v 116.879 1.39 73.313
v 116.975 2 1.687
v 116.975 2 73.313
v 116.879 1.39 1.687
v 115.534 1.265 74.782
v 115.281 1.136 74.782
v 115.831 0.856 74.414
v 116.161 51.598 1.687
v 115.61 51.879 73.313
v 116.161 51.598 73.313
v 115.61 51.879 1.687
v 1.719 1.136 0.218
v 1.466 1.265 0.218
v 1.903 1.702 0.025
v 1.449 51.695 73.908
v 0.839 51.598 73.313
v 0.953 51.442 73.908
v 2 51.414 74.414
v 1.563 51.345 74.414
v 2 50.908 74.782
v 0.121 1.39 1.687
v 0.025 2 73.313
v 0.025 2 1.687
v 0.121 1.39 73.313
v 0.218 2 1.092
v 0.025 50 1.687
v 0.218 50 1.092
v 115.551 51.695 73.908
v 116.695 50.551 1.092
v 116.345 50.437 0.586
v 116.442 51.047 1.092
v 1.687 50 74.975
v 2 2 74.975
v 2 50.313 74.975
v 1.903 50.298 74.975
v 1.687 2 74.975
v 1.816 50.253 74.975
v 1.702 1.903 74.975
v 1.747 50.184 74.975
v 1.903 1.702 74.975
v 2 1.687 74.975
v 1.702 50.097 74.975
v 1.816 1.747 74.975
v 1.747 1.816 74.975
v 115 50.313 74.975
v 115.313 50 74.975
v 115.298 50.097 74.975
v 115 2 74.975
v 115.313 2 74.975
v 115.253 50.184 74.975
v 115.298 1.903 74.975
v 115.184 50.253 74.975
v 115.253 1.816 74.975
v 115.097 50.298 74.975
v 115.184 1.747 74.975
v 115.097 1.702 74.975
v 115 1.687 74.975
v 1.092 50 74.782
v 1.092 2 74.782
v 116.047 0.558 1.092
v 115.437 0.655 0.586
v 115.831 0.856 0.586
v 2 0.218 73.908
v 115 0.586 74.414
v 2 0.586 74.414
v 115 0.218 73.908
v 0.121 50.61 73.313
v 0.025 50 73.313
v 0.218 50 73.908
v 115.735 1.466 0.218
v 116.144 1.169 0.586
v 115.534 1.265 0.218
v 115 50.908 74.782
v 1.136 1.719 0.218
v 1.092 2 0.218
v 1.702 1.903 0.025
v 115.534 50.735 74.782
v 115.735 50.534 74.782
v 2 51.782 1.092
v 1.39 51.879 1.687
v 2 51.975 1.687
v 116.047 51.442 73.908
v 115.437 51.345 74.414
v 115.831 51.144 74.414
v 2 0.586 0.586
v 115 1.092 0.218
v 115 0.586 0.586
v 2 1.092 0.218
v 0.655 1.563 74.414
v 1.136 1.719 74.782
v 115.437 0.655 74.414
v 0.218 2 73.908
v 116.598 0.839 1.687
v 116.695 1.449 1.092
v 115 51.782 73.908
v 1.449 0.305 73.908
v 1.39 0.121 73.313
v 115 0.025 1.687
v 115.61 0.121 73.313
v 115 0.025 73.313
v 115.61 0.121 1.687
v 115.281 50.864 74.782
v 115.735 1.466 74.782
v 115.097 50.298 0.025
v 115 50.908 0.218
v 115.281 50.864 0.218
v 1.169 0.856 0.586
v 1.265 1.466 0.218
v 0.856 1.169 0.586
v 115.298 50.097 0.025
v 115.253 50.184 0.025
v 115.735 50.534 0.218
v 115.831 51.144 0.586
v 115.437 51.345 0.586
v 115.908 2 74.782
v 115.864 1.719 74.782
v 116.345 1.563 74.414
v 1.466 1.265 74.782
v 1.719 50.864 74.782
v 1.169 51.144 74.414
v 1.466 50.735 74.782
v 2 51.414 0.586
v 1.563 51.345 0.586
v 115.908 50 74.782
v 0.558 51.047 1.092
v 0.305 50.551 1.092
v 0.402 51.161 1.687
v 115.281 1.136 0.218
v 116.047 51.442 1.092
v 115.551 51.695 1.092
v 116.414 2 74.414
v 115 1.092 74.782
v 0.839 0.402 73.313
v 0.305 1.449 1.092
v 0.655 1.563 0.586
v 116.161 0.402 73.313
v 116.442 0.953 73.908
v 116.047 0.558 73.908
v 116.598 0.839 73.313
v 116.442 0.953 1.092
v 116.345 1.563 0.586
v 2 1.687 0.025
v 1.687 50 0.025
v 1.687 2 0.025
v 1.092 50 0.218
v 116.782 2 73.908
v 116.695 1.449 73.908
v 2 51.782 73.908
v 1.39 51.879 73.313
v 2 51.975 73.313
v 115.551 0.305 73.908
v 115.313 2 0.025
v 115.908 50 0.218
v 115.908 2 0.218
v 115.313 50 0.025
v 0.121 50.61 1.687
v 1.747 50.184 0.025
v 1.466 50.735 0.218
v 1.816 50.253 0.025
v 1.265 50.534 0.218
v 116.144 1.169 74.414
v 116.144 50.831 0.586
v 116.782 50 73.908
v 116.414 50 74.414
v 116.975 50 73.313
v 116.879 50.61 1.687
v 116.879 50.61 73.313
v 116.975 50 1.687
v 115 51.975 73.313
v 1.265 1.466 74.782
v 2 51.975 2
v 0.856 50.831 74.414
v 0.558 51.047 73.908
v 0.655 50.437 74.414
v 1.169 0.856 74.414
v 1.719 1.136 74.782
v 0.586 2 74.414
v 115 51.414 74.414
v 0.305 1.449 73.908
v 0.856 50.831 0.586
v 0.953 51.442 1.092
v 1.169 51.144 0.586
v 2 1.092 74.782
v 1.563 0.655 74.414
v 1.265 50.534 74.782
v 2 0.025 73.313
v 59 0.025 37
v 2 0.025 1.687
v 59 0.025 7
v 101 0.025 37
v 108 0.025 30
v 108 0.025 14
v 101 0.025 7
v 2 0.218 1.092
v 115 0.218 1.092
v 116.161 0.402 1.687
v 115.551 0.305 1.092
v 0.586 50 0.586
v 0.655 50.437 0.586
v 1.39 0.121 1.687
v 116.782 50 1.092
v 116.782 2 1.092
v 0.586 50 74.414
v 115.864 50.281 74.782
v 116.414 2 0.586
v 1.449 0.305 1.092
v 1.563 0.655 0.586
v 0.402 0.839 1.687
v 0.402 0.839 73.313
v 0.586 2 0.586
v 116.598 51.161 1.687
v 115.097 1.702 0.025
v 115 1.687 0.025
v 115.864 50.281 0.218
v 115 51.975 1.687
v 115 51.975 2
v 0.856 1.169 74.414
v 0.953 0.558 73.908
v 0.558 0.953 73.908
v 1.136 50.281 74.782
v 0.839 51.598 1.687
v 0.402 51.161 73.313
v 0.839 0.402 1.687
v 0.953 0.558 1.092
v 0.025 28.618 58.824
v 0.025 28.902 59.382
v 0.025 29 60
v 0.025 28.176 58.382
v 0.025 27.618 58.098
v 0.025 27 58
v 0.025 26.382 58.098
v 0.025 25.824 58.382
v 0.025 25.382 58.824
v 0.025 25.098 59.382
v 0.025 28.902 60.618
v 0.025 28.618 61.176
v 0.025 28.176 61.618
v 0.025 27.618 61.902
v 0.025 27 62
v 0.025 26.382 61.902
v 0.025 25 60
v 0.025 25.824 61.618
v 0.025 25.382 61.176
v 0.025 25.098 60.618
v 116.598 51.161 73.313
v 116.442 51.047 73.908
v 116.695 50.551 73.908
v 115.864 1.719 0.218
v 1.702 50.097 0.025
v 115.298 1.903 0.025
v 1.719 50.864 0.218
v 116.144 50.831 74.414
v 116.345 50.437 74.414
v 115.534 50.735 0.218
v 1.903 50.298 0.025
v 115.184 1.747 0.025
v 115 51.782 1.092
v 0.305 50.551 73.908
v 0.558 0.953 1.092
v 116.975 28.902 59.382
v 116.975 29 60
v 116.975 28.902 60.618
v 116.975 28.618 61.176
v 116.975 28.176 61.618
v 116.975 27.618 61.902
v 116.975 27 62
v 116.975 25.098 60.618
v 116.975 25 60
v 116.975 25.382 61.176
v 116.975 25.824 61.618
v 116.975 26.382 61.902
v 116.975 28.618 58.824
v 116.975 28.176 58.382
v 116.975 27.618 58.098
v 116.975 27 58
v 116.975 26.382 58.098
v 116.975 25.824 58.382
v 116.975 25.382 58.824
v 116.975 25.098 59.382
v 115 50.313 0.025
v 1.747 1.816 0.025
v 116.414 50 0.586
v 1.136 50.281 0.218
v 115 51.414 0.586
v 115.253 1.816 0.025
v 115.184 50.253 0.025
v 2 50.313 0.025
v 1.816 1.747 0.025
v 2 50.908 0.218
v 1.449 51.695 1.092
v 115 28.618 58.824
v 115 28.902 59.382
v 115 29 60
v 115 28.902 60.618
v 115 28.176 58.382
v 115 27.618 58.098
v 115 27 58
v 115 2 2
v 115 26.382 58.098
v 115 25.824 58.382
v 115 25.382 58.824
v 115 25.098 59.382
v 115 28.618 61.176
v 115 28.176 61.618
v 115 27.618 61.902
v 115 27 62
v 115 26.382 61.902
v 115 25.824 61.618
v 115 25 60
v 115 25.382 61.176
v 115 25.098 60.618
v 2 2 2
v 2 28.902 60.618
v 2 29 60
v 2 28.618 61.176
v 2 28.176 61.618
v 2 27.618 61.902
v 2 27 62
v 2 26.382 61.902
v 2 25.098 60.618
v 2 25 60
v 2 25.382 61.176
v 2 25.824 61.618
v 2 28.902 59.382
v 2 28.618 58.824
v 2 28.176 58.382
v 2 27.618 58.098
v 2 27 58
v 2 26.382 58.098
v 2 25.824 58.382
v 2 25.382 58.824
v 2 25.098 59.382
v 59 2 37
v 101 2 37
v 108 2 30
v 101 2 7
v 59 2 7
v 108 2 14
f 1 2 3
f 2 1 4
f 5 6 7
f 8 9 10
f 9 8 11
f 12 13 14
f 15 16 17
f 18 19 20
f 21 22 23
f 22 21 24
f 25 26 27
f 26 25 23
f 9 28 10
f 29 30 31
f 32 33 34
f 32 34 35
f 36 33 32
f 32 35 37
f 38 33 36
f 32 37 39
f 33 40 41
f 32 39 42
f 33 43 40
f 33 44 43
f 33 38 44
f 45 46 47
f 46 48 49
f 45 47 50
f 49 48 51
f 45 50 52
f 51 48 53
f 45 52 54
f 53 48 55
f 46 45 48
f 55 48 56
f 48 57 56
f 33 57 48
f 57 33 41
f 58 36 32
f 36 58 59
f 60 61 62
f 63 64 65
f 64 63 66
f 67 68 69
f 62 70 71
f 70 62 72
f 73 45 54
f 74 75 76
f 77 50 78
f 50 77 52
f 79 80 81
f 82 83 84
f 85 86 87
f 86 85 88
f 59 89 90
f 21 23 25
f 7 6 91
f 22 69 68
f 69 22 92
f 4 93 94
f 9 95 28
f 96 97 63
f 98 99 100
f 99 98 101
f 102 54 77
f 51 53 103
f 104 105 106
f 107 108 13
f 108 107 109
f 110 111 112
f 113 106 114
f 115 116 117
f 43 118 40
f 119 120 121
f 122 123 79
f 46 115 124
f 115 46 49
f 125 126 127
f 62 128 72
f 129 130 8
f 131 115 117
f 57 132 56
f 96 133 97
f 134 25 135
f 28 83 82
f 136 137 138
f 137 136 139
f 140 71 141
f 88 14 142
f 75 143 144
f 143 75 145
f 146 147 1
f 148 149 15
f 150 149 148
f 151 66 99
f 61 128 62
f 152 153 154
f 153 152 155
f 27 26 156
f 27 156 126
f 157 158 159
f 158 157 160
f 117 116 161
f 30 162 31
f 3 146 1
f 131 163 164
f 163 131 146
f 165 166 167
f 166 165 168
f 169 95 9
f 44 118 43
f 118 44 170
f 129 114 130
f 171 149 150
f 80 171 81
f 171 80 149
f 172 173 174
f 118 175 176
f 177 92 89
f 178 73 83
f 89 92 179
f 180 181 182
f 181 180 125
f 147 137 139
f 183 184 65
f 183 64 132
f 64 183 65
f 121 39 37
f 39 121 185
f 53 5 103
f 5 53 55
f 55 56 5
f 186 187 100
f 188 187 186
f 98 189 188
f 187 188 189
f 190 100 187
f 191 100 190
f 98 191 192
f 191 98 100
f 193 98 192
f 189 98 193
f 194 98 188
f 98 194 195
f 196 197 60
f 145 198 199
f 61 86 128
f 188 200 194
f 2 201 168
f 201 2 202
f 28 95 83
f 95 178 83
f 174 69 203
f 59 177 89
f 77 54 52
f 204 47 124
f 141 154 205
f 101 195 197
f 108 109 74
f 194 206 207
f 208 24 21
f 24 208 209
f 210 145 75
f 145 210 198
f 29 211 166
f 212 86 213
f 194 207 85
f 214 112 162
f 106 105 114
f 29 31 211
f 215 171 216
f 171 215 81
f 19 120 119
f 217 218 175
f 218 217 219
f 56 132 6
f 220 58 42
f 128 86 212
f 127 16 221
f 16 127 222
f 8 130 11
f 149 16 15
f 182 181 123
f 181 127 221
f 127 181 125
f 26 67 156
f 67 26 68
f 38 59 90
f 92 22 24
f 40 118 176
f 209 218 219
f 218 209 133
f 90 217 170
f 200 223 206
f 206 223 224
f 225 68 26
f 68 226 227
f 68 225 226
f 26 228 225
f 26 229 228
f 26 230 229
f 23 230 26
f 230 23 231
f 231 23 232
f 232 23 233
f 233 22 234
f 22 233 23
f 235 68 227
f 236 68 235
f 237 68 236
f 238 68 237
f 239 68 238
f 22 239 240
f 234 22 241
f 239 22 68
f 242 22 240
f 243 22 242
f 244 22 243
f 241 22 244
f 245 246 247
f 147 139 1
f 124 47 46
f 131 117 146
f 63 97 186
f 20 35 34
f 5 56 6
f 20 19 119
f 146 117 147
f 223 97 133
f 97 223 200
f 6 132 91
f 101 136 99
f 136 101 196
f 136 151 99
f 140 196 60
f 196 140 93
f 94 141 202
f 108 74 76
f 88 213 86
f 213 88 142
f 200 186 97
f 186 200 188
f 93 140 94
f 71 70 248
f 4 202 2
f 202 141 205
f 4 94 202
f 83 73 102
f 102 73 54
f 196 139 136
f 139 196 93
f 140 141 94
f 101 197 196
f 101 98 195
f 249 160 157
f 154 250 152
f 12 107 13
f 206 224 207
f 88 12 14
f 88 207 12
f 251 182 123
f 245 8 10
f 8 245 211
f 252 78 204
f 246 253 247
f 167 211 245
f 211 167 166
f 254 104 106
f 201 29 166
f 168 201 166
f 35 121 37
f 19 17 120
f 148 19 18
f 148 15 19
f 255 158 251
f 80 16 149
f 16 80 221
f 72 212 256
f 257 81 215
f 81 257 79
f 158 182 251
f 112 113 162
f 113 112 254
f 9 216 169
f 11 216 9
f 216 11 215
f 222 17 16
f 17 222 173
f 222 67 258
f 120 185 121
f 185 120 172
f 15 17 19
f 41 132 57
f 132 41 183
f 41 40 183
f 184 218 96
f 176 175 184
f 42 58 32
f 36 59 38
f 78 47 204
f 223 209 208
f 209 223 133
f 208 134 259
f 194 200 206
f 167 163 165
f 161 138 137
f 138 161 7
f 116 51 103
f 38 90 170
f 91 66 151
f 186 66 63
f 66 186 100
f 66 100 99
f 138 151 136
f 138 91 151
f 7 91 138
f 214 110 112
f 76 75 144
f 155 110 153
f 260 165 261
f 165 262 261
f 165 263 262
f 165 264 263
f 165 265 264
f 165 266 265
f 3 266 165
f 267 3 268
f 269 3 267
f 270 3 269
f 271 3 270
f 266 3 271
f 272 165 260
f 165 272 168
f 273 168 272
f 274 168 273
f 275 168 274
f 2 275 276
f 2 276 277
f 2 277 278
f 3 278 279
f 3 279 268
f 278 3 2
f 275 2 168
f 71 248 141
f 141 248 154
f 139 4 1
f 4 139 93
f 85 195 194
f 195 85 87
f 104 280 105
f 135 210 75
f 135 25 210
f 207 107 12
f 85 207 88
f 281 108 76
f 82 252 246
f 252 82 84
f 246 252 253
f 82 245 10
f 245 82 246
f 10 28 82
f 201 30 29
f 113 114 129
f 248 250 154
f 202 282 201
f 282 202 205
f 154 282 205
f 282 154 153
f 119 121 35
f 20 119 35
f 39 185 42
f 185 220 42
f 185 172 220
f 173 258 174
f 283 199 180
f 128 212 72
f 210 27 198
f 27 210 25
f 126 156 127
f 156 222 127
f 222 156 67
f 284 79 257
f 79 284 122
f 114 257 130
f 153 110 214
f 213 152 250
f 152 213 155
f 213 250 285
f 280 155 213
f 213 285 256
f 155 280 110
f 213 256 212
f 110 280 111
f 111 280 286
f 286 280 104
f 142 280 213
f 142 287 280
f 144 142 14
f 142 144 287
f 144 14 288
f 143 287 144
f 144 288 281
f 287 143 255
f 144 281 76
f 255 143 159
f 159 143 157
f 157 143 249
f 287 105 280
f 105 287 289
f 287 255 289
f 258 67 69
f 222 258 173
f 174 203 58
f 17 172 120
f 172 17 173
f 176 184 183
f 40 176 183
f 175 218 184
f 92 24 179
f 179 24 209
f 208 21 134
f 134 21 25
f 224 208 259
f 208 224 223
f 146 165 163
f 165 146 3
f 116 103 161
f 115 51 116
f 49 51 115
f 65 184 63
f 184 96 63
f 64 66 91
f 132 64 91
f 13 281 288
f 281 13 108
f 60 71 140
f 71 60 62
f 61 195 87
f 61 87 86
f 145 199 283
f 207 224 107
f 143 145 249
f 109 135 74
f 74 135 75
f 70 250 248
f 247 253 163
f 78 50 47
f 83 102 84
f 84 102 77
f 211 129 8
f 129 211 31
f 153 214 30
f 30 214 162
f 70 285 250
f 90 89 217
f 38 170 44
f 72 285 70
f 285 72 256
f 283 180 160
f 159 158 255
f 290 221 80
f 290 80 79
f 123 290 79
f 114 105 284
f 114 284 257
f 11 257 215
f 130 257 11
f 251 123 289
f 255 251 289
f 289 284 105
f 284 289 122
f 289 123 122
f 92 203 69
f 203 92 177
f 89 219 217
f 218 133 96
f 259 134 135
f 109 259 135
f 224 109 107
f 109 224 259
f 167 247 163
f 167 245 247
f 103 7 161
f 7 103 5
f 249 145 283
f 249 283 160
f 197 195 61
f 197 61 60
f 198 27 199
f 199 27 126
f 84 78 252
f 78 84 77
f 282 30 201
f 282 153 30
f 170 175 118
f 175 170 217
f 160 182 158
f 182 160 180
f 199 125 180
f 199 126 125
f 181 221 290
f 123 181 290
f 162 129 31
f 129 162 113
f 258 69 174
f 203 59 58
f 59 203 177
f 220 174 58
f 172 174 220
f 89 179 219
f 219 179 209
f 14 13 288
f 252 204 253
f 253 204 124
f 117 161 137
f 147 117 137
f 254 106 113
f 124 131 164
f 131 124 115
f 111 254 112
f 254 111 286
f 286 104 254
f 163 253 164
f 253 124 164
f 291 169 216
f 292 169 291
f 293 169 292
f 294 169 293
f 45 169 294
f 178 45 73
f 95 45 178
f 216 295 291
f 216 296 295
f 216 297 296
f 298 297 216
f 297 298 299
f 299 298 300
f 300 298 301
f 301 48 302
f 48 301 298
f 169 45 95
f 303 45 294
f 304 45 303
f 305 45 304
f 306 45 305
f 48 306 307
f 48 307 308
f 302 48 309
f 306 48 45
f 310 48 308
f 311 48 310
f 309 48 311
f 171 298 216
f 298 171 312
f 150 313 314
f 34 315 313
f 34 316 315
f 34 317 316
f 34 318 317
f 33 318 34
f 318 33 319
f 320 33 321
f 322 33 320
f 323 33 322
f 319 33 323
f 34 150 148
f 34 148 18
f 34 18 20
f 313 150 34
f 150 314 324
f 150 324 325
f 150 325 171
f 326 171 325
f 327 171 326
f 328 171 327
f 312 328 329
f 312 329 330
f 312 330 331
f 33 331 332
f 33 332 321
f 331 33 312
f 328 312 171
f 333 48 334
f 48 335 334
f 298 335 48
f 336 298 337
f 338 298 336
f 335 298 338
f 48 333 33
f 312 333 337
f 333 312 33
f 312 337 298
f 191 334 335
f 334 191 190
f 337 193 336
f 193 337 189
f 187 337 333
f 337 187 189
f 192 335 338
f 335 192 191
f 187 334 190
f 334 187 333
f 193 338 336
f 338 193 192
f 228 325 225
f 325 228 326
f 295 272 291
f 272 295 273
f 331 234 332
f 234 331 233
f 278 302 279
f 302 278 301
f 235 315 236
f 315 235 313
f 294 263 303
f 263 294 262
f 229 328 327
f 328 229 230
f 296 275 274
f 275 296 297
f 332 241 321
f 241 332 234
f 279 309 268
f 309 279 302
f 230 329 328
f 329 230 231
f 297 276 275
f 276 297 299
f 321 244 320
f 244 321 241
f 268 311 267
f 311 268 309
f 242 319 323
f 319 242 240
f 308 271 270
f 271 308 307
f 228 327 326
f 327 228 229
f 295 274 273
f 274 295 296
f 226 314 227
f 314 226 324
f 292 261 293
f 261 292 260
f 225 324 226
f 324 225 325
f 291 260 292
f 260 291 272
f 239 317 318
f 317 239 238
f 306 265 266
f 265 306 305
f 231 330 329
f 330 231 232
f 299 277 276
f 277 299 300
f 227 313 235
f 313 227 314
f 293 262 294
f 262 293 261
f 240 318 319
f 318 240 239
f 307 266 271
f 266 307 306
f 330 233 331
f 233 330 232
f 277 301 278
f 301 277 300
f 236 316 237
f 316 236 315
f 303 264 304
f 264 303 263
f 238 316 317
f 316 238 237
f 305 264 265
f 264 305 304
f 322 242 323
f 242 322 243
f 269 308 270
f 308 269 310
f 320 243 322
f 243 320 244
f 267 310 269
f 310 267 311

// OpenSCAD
/* [Plug Options] */
//The width of the plug, in mm (The long way)
plugWidth=49;
//The height of the plug, in mm (The short way)
plugHeight=30;
//How far the angles on the plug should go, measured along the x axis from the right, in mm
plugChamfer=7;
//At 0, the plug will be in the bottom right corner, but not hitting the chamfer or the interior. This moves the plug left, in mm.
plugXOffset=5;
//Moves the plug up, in mm
plugZOffset=5;

/* [Case Options] */
//The thickness of the case, in mm
thickness=2;
//The width of the interior of the case, in mm
width=113;
//The height of the case, in mm
height=75;
//The interior depth of the case, in mm
depth=50;
//The radius of the fillets (Rounded edges), in mm. Set to 0 for square edges
filletR=2;

/* [Hole] */
//Whether or not to make the hole for a screw.
makeHole="Yes";//[Yes,No]
//The diameter of the hole
holeD=4;
//How high from the bottom of the case to center the hole
holeHeight=60;
//How far from the back of the case to center the hole
holeLocation=25;

/* [Hidden] */
nm=.1;
nm2=2*nm;
holeR=holeD/2;

module roundedCube(size,r,fn=20)
{
    width=size[0];
    depth=size[1];
    height=size[2];
    if(r==0)
        cube(size);
    else
    {
        hull()
        {
            for(x = [r,width-r])
                for(y = [r,depth-r])
                    for(z = [r,height-r])
                        translate([x,y,z])
                            sphere(r=r,$fn=fn);
        }
    }
}

module plug()
{
        hull()
        {
            cube([plugWidth-plugChamfer,plugHeight,thickness+nm2]);
            translate([0,plugChamfer,0])
                cube([plugWidth,plugHeight-2*plugChamfer,thickness+nm2]);
        };
}


difference()
{
    roundedCube([width+2*thickness,depth+thickness,height],filletR,fn=20);
    
    translate([thickness,thickness,thickness])
    roundedCube([width,depth+thickness,height],max(filletR-thickness,0),fn=20);

    translate([width-max(filletR+thickness)-plugWidth+thickness*2-plugXOffset,nm+thickness,max(filletR,thickness)+plugZOffset])
        rotate([90,0,0])
            plug();
    
    if(makeHole=="Yes")
        translate([-nm,depth-holeLocation+thickness,holeHeight])
            rotate([0,90,0])
                cylinder(r=holeR,h=width+nm2+2*thickness,$fn=20);
    
}
